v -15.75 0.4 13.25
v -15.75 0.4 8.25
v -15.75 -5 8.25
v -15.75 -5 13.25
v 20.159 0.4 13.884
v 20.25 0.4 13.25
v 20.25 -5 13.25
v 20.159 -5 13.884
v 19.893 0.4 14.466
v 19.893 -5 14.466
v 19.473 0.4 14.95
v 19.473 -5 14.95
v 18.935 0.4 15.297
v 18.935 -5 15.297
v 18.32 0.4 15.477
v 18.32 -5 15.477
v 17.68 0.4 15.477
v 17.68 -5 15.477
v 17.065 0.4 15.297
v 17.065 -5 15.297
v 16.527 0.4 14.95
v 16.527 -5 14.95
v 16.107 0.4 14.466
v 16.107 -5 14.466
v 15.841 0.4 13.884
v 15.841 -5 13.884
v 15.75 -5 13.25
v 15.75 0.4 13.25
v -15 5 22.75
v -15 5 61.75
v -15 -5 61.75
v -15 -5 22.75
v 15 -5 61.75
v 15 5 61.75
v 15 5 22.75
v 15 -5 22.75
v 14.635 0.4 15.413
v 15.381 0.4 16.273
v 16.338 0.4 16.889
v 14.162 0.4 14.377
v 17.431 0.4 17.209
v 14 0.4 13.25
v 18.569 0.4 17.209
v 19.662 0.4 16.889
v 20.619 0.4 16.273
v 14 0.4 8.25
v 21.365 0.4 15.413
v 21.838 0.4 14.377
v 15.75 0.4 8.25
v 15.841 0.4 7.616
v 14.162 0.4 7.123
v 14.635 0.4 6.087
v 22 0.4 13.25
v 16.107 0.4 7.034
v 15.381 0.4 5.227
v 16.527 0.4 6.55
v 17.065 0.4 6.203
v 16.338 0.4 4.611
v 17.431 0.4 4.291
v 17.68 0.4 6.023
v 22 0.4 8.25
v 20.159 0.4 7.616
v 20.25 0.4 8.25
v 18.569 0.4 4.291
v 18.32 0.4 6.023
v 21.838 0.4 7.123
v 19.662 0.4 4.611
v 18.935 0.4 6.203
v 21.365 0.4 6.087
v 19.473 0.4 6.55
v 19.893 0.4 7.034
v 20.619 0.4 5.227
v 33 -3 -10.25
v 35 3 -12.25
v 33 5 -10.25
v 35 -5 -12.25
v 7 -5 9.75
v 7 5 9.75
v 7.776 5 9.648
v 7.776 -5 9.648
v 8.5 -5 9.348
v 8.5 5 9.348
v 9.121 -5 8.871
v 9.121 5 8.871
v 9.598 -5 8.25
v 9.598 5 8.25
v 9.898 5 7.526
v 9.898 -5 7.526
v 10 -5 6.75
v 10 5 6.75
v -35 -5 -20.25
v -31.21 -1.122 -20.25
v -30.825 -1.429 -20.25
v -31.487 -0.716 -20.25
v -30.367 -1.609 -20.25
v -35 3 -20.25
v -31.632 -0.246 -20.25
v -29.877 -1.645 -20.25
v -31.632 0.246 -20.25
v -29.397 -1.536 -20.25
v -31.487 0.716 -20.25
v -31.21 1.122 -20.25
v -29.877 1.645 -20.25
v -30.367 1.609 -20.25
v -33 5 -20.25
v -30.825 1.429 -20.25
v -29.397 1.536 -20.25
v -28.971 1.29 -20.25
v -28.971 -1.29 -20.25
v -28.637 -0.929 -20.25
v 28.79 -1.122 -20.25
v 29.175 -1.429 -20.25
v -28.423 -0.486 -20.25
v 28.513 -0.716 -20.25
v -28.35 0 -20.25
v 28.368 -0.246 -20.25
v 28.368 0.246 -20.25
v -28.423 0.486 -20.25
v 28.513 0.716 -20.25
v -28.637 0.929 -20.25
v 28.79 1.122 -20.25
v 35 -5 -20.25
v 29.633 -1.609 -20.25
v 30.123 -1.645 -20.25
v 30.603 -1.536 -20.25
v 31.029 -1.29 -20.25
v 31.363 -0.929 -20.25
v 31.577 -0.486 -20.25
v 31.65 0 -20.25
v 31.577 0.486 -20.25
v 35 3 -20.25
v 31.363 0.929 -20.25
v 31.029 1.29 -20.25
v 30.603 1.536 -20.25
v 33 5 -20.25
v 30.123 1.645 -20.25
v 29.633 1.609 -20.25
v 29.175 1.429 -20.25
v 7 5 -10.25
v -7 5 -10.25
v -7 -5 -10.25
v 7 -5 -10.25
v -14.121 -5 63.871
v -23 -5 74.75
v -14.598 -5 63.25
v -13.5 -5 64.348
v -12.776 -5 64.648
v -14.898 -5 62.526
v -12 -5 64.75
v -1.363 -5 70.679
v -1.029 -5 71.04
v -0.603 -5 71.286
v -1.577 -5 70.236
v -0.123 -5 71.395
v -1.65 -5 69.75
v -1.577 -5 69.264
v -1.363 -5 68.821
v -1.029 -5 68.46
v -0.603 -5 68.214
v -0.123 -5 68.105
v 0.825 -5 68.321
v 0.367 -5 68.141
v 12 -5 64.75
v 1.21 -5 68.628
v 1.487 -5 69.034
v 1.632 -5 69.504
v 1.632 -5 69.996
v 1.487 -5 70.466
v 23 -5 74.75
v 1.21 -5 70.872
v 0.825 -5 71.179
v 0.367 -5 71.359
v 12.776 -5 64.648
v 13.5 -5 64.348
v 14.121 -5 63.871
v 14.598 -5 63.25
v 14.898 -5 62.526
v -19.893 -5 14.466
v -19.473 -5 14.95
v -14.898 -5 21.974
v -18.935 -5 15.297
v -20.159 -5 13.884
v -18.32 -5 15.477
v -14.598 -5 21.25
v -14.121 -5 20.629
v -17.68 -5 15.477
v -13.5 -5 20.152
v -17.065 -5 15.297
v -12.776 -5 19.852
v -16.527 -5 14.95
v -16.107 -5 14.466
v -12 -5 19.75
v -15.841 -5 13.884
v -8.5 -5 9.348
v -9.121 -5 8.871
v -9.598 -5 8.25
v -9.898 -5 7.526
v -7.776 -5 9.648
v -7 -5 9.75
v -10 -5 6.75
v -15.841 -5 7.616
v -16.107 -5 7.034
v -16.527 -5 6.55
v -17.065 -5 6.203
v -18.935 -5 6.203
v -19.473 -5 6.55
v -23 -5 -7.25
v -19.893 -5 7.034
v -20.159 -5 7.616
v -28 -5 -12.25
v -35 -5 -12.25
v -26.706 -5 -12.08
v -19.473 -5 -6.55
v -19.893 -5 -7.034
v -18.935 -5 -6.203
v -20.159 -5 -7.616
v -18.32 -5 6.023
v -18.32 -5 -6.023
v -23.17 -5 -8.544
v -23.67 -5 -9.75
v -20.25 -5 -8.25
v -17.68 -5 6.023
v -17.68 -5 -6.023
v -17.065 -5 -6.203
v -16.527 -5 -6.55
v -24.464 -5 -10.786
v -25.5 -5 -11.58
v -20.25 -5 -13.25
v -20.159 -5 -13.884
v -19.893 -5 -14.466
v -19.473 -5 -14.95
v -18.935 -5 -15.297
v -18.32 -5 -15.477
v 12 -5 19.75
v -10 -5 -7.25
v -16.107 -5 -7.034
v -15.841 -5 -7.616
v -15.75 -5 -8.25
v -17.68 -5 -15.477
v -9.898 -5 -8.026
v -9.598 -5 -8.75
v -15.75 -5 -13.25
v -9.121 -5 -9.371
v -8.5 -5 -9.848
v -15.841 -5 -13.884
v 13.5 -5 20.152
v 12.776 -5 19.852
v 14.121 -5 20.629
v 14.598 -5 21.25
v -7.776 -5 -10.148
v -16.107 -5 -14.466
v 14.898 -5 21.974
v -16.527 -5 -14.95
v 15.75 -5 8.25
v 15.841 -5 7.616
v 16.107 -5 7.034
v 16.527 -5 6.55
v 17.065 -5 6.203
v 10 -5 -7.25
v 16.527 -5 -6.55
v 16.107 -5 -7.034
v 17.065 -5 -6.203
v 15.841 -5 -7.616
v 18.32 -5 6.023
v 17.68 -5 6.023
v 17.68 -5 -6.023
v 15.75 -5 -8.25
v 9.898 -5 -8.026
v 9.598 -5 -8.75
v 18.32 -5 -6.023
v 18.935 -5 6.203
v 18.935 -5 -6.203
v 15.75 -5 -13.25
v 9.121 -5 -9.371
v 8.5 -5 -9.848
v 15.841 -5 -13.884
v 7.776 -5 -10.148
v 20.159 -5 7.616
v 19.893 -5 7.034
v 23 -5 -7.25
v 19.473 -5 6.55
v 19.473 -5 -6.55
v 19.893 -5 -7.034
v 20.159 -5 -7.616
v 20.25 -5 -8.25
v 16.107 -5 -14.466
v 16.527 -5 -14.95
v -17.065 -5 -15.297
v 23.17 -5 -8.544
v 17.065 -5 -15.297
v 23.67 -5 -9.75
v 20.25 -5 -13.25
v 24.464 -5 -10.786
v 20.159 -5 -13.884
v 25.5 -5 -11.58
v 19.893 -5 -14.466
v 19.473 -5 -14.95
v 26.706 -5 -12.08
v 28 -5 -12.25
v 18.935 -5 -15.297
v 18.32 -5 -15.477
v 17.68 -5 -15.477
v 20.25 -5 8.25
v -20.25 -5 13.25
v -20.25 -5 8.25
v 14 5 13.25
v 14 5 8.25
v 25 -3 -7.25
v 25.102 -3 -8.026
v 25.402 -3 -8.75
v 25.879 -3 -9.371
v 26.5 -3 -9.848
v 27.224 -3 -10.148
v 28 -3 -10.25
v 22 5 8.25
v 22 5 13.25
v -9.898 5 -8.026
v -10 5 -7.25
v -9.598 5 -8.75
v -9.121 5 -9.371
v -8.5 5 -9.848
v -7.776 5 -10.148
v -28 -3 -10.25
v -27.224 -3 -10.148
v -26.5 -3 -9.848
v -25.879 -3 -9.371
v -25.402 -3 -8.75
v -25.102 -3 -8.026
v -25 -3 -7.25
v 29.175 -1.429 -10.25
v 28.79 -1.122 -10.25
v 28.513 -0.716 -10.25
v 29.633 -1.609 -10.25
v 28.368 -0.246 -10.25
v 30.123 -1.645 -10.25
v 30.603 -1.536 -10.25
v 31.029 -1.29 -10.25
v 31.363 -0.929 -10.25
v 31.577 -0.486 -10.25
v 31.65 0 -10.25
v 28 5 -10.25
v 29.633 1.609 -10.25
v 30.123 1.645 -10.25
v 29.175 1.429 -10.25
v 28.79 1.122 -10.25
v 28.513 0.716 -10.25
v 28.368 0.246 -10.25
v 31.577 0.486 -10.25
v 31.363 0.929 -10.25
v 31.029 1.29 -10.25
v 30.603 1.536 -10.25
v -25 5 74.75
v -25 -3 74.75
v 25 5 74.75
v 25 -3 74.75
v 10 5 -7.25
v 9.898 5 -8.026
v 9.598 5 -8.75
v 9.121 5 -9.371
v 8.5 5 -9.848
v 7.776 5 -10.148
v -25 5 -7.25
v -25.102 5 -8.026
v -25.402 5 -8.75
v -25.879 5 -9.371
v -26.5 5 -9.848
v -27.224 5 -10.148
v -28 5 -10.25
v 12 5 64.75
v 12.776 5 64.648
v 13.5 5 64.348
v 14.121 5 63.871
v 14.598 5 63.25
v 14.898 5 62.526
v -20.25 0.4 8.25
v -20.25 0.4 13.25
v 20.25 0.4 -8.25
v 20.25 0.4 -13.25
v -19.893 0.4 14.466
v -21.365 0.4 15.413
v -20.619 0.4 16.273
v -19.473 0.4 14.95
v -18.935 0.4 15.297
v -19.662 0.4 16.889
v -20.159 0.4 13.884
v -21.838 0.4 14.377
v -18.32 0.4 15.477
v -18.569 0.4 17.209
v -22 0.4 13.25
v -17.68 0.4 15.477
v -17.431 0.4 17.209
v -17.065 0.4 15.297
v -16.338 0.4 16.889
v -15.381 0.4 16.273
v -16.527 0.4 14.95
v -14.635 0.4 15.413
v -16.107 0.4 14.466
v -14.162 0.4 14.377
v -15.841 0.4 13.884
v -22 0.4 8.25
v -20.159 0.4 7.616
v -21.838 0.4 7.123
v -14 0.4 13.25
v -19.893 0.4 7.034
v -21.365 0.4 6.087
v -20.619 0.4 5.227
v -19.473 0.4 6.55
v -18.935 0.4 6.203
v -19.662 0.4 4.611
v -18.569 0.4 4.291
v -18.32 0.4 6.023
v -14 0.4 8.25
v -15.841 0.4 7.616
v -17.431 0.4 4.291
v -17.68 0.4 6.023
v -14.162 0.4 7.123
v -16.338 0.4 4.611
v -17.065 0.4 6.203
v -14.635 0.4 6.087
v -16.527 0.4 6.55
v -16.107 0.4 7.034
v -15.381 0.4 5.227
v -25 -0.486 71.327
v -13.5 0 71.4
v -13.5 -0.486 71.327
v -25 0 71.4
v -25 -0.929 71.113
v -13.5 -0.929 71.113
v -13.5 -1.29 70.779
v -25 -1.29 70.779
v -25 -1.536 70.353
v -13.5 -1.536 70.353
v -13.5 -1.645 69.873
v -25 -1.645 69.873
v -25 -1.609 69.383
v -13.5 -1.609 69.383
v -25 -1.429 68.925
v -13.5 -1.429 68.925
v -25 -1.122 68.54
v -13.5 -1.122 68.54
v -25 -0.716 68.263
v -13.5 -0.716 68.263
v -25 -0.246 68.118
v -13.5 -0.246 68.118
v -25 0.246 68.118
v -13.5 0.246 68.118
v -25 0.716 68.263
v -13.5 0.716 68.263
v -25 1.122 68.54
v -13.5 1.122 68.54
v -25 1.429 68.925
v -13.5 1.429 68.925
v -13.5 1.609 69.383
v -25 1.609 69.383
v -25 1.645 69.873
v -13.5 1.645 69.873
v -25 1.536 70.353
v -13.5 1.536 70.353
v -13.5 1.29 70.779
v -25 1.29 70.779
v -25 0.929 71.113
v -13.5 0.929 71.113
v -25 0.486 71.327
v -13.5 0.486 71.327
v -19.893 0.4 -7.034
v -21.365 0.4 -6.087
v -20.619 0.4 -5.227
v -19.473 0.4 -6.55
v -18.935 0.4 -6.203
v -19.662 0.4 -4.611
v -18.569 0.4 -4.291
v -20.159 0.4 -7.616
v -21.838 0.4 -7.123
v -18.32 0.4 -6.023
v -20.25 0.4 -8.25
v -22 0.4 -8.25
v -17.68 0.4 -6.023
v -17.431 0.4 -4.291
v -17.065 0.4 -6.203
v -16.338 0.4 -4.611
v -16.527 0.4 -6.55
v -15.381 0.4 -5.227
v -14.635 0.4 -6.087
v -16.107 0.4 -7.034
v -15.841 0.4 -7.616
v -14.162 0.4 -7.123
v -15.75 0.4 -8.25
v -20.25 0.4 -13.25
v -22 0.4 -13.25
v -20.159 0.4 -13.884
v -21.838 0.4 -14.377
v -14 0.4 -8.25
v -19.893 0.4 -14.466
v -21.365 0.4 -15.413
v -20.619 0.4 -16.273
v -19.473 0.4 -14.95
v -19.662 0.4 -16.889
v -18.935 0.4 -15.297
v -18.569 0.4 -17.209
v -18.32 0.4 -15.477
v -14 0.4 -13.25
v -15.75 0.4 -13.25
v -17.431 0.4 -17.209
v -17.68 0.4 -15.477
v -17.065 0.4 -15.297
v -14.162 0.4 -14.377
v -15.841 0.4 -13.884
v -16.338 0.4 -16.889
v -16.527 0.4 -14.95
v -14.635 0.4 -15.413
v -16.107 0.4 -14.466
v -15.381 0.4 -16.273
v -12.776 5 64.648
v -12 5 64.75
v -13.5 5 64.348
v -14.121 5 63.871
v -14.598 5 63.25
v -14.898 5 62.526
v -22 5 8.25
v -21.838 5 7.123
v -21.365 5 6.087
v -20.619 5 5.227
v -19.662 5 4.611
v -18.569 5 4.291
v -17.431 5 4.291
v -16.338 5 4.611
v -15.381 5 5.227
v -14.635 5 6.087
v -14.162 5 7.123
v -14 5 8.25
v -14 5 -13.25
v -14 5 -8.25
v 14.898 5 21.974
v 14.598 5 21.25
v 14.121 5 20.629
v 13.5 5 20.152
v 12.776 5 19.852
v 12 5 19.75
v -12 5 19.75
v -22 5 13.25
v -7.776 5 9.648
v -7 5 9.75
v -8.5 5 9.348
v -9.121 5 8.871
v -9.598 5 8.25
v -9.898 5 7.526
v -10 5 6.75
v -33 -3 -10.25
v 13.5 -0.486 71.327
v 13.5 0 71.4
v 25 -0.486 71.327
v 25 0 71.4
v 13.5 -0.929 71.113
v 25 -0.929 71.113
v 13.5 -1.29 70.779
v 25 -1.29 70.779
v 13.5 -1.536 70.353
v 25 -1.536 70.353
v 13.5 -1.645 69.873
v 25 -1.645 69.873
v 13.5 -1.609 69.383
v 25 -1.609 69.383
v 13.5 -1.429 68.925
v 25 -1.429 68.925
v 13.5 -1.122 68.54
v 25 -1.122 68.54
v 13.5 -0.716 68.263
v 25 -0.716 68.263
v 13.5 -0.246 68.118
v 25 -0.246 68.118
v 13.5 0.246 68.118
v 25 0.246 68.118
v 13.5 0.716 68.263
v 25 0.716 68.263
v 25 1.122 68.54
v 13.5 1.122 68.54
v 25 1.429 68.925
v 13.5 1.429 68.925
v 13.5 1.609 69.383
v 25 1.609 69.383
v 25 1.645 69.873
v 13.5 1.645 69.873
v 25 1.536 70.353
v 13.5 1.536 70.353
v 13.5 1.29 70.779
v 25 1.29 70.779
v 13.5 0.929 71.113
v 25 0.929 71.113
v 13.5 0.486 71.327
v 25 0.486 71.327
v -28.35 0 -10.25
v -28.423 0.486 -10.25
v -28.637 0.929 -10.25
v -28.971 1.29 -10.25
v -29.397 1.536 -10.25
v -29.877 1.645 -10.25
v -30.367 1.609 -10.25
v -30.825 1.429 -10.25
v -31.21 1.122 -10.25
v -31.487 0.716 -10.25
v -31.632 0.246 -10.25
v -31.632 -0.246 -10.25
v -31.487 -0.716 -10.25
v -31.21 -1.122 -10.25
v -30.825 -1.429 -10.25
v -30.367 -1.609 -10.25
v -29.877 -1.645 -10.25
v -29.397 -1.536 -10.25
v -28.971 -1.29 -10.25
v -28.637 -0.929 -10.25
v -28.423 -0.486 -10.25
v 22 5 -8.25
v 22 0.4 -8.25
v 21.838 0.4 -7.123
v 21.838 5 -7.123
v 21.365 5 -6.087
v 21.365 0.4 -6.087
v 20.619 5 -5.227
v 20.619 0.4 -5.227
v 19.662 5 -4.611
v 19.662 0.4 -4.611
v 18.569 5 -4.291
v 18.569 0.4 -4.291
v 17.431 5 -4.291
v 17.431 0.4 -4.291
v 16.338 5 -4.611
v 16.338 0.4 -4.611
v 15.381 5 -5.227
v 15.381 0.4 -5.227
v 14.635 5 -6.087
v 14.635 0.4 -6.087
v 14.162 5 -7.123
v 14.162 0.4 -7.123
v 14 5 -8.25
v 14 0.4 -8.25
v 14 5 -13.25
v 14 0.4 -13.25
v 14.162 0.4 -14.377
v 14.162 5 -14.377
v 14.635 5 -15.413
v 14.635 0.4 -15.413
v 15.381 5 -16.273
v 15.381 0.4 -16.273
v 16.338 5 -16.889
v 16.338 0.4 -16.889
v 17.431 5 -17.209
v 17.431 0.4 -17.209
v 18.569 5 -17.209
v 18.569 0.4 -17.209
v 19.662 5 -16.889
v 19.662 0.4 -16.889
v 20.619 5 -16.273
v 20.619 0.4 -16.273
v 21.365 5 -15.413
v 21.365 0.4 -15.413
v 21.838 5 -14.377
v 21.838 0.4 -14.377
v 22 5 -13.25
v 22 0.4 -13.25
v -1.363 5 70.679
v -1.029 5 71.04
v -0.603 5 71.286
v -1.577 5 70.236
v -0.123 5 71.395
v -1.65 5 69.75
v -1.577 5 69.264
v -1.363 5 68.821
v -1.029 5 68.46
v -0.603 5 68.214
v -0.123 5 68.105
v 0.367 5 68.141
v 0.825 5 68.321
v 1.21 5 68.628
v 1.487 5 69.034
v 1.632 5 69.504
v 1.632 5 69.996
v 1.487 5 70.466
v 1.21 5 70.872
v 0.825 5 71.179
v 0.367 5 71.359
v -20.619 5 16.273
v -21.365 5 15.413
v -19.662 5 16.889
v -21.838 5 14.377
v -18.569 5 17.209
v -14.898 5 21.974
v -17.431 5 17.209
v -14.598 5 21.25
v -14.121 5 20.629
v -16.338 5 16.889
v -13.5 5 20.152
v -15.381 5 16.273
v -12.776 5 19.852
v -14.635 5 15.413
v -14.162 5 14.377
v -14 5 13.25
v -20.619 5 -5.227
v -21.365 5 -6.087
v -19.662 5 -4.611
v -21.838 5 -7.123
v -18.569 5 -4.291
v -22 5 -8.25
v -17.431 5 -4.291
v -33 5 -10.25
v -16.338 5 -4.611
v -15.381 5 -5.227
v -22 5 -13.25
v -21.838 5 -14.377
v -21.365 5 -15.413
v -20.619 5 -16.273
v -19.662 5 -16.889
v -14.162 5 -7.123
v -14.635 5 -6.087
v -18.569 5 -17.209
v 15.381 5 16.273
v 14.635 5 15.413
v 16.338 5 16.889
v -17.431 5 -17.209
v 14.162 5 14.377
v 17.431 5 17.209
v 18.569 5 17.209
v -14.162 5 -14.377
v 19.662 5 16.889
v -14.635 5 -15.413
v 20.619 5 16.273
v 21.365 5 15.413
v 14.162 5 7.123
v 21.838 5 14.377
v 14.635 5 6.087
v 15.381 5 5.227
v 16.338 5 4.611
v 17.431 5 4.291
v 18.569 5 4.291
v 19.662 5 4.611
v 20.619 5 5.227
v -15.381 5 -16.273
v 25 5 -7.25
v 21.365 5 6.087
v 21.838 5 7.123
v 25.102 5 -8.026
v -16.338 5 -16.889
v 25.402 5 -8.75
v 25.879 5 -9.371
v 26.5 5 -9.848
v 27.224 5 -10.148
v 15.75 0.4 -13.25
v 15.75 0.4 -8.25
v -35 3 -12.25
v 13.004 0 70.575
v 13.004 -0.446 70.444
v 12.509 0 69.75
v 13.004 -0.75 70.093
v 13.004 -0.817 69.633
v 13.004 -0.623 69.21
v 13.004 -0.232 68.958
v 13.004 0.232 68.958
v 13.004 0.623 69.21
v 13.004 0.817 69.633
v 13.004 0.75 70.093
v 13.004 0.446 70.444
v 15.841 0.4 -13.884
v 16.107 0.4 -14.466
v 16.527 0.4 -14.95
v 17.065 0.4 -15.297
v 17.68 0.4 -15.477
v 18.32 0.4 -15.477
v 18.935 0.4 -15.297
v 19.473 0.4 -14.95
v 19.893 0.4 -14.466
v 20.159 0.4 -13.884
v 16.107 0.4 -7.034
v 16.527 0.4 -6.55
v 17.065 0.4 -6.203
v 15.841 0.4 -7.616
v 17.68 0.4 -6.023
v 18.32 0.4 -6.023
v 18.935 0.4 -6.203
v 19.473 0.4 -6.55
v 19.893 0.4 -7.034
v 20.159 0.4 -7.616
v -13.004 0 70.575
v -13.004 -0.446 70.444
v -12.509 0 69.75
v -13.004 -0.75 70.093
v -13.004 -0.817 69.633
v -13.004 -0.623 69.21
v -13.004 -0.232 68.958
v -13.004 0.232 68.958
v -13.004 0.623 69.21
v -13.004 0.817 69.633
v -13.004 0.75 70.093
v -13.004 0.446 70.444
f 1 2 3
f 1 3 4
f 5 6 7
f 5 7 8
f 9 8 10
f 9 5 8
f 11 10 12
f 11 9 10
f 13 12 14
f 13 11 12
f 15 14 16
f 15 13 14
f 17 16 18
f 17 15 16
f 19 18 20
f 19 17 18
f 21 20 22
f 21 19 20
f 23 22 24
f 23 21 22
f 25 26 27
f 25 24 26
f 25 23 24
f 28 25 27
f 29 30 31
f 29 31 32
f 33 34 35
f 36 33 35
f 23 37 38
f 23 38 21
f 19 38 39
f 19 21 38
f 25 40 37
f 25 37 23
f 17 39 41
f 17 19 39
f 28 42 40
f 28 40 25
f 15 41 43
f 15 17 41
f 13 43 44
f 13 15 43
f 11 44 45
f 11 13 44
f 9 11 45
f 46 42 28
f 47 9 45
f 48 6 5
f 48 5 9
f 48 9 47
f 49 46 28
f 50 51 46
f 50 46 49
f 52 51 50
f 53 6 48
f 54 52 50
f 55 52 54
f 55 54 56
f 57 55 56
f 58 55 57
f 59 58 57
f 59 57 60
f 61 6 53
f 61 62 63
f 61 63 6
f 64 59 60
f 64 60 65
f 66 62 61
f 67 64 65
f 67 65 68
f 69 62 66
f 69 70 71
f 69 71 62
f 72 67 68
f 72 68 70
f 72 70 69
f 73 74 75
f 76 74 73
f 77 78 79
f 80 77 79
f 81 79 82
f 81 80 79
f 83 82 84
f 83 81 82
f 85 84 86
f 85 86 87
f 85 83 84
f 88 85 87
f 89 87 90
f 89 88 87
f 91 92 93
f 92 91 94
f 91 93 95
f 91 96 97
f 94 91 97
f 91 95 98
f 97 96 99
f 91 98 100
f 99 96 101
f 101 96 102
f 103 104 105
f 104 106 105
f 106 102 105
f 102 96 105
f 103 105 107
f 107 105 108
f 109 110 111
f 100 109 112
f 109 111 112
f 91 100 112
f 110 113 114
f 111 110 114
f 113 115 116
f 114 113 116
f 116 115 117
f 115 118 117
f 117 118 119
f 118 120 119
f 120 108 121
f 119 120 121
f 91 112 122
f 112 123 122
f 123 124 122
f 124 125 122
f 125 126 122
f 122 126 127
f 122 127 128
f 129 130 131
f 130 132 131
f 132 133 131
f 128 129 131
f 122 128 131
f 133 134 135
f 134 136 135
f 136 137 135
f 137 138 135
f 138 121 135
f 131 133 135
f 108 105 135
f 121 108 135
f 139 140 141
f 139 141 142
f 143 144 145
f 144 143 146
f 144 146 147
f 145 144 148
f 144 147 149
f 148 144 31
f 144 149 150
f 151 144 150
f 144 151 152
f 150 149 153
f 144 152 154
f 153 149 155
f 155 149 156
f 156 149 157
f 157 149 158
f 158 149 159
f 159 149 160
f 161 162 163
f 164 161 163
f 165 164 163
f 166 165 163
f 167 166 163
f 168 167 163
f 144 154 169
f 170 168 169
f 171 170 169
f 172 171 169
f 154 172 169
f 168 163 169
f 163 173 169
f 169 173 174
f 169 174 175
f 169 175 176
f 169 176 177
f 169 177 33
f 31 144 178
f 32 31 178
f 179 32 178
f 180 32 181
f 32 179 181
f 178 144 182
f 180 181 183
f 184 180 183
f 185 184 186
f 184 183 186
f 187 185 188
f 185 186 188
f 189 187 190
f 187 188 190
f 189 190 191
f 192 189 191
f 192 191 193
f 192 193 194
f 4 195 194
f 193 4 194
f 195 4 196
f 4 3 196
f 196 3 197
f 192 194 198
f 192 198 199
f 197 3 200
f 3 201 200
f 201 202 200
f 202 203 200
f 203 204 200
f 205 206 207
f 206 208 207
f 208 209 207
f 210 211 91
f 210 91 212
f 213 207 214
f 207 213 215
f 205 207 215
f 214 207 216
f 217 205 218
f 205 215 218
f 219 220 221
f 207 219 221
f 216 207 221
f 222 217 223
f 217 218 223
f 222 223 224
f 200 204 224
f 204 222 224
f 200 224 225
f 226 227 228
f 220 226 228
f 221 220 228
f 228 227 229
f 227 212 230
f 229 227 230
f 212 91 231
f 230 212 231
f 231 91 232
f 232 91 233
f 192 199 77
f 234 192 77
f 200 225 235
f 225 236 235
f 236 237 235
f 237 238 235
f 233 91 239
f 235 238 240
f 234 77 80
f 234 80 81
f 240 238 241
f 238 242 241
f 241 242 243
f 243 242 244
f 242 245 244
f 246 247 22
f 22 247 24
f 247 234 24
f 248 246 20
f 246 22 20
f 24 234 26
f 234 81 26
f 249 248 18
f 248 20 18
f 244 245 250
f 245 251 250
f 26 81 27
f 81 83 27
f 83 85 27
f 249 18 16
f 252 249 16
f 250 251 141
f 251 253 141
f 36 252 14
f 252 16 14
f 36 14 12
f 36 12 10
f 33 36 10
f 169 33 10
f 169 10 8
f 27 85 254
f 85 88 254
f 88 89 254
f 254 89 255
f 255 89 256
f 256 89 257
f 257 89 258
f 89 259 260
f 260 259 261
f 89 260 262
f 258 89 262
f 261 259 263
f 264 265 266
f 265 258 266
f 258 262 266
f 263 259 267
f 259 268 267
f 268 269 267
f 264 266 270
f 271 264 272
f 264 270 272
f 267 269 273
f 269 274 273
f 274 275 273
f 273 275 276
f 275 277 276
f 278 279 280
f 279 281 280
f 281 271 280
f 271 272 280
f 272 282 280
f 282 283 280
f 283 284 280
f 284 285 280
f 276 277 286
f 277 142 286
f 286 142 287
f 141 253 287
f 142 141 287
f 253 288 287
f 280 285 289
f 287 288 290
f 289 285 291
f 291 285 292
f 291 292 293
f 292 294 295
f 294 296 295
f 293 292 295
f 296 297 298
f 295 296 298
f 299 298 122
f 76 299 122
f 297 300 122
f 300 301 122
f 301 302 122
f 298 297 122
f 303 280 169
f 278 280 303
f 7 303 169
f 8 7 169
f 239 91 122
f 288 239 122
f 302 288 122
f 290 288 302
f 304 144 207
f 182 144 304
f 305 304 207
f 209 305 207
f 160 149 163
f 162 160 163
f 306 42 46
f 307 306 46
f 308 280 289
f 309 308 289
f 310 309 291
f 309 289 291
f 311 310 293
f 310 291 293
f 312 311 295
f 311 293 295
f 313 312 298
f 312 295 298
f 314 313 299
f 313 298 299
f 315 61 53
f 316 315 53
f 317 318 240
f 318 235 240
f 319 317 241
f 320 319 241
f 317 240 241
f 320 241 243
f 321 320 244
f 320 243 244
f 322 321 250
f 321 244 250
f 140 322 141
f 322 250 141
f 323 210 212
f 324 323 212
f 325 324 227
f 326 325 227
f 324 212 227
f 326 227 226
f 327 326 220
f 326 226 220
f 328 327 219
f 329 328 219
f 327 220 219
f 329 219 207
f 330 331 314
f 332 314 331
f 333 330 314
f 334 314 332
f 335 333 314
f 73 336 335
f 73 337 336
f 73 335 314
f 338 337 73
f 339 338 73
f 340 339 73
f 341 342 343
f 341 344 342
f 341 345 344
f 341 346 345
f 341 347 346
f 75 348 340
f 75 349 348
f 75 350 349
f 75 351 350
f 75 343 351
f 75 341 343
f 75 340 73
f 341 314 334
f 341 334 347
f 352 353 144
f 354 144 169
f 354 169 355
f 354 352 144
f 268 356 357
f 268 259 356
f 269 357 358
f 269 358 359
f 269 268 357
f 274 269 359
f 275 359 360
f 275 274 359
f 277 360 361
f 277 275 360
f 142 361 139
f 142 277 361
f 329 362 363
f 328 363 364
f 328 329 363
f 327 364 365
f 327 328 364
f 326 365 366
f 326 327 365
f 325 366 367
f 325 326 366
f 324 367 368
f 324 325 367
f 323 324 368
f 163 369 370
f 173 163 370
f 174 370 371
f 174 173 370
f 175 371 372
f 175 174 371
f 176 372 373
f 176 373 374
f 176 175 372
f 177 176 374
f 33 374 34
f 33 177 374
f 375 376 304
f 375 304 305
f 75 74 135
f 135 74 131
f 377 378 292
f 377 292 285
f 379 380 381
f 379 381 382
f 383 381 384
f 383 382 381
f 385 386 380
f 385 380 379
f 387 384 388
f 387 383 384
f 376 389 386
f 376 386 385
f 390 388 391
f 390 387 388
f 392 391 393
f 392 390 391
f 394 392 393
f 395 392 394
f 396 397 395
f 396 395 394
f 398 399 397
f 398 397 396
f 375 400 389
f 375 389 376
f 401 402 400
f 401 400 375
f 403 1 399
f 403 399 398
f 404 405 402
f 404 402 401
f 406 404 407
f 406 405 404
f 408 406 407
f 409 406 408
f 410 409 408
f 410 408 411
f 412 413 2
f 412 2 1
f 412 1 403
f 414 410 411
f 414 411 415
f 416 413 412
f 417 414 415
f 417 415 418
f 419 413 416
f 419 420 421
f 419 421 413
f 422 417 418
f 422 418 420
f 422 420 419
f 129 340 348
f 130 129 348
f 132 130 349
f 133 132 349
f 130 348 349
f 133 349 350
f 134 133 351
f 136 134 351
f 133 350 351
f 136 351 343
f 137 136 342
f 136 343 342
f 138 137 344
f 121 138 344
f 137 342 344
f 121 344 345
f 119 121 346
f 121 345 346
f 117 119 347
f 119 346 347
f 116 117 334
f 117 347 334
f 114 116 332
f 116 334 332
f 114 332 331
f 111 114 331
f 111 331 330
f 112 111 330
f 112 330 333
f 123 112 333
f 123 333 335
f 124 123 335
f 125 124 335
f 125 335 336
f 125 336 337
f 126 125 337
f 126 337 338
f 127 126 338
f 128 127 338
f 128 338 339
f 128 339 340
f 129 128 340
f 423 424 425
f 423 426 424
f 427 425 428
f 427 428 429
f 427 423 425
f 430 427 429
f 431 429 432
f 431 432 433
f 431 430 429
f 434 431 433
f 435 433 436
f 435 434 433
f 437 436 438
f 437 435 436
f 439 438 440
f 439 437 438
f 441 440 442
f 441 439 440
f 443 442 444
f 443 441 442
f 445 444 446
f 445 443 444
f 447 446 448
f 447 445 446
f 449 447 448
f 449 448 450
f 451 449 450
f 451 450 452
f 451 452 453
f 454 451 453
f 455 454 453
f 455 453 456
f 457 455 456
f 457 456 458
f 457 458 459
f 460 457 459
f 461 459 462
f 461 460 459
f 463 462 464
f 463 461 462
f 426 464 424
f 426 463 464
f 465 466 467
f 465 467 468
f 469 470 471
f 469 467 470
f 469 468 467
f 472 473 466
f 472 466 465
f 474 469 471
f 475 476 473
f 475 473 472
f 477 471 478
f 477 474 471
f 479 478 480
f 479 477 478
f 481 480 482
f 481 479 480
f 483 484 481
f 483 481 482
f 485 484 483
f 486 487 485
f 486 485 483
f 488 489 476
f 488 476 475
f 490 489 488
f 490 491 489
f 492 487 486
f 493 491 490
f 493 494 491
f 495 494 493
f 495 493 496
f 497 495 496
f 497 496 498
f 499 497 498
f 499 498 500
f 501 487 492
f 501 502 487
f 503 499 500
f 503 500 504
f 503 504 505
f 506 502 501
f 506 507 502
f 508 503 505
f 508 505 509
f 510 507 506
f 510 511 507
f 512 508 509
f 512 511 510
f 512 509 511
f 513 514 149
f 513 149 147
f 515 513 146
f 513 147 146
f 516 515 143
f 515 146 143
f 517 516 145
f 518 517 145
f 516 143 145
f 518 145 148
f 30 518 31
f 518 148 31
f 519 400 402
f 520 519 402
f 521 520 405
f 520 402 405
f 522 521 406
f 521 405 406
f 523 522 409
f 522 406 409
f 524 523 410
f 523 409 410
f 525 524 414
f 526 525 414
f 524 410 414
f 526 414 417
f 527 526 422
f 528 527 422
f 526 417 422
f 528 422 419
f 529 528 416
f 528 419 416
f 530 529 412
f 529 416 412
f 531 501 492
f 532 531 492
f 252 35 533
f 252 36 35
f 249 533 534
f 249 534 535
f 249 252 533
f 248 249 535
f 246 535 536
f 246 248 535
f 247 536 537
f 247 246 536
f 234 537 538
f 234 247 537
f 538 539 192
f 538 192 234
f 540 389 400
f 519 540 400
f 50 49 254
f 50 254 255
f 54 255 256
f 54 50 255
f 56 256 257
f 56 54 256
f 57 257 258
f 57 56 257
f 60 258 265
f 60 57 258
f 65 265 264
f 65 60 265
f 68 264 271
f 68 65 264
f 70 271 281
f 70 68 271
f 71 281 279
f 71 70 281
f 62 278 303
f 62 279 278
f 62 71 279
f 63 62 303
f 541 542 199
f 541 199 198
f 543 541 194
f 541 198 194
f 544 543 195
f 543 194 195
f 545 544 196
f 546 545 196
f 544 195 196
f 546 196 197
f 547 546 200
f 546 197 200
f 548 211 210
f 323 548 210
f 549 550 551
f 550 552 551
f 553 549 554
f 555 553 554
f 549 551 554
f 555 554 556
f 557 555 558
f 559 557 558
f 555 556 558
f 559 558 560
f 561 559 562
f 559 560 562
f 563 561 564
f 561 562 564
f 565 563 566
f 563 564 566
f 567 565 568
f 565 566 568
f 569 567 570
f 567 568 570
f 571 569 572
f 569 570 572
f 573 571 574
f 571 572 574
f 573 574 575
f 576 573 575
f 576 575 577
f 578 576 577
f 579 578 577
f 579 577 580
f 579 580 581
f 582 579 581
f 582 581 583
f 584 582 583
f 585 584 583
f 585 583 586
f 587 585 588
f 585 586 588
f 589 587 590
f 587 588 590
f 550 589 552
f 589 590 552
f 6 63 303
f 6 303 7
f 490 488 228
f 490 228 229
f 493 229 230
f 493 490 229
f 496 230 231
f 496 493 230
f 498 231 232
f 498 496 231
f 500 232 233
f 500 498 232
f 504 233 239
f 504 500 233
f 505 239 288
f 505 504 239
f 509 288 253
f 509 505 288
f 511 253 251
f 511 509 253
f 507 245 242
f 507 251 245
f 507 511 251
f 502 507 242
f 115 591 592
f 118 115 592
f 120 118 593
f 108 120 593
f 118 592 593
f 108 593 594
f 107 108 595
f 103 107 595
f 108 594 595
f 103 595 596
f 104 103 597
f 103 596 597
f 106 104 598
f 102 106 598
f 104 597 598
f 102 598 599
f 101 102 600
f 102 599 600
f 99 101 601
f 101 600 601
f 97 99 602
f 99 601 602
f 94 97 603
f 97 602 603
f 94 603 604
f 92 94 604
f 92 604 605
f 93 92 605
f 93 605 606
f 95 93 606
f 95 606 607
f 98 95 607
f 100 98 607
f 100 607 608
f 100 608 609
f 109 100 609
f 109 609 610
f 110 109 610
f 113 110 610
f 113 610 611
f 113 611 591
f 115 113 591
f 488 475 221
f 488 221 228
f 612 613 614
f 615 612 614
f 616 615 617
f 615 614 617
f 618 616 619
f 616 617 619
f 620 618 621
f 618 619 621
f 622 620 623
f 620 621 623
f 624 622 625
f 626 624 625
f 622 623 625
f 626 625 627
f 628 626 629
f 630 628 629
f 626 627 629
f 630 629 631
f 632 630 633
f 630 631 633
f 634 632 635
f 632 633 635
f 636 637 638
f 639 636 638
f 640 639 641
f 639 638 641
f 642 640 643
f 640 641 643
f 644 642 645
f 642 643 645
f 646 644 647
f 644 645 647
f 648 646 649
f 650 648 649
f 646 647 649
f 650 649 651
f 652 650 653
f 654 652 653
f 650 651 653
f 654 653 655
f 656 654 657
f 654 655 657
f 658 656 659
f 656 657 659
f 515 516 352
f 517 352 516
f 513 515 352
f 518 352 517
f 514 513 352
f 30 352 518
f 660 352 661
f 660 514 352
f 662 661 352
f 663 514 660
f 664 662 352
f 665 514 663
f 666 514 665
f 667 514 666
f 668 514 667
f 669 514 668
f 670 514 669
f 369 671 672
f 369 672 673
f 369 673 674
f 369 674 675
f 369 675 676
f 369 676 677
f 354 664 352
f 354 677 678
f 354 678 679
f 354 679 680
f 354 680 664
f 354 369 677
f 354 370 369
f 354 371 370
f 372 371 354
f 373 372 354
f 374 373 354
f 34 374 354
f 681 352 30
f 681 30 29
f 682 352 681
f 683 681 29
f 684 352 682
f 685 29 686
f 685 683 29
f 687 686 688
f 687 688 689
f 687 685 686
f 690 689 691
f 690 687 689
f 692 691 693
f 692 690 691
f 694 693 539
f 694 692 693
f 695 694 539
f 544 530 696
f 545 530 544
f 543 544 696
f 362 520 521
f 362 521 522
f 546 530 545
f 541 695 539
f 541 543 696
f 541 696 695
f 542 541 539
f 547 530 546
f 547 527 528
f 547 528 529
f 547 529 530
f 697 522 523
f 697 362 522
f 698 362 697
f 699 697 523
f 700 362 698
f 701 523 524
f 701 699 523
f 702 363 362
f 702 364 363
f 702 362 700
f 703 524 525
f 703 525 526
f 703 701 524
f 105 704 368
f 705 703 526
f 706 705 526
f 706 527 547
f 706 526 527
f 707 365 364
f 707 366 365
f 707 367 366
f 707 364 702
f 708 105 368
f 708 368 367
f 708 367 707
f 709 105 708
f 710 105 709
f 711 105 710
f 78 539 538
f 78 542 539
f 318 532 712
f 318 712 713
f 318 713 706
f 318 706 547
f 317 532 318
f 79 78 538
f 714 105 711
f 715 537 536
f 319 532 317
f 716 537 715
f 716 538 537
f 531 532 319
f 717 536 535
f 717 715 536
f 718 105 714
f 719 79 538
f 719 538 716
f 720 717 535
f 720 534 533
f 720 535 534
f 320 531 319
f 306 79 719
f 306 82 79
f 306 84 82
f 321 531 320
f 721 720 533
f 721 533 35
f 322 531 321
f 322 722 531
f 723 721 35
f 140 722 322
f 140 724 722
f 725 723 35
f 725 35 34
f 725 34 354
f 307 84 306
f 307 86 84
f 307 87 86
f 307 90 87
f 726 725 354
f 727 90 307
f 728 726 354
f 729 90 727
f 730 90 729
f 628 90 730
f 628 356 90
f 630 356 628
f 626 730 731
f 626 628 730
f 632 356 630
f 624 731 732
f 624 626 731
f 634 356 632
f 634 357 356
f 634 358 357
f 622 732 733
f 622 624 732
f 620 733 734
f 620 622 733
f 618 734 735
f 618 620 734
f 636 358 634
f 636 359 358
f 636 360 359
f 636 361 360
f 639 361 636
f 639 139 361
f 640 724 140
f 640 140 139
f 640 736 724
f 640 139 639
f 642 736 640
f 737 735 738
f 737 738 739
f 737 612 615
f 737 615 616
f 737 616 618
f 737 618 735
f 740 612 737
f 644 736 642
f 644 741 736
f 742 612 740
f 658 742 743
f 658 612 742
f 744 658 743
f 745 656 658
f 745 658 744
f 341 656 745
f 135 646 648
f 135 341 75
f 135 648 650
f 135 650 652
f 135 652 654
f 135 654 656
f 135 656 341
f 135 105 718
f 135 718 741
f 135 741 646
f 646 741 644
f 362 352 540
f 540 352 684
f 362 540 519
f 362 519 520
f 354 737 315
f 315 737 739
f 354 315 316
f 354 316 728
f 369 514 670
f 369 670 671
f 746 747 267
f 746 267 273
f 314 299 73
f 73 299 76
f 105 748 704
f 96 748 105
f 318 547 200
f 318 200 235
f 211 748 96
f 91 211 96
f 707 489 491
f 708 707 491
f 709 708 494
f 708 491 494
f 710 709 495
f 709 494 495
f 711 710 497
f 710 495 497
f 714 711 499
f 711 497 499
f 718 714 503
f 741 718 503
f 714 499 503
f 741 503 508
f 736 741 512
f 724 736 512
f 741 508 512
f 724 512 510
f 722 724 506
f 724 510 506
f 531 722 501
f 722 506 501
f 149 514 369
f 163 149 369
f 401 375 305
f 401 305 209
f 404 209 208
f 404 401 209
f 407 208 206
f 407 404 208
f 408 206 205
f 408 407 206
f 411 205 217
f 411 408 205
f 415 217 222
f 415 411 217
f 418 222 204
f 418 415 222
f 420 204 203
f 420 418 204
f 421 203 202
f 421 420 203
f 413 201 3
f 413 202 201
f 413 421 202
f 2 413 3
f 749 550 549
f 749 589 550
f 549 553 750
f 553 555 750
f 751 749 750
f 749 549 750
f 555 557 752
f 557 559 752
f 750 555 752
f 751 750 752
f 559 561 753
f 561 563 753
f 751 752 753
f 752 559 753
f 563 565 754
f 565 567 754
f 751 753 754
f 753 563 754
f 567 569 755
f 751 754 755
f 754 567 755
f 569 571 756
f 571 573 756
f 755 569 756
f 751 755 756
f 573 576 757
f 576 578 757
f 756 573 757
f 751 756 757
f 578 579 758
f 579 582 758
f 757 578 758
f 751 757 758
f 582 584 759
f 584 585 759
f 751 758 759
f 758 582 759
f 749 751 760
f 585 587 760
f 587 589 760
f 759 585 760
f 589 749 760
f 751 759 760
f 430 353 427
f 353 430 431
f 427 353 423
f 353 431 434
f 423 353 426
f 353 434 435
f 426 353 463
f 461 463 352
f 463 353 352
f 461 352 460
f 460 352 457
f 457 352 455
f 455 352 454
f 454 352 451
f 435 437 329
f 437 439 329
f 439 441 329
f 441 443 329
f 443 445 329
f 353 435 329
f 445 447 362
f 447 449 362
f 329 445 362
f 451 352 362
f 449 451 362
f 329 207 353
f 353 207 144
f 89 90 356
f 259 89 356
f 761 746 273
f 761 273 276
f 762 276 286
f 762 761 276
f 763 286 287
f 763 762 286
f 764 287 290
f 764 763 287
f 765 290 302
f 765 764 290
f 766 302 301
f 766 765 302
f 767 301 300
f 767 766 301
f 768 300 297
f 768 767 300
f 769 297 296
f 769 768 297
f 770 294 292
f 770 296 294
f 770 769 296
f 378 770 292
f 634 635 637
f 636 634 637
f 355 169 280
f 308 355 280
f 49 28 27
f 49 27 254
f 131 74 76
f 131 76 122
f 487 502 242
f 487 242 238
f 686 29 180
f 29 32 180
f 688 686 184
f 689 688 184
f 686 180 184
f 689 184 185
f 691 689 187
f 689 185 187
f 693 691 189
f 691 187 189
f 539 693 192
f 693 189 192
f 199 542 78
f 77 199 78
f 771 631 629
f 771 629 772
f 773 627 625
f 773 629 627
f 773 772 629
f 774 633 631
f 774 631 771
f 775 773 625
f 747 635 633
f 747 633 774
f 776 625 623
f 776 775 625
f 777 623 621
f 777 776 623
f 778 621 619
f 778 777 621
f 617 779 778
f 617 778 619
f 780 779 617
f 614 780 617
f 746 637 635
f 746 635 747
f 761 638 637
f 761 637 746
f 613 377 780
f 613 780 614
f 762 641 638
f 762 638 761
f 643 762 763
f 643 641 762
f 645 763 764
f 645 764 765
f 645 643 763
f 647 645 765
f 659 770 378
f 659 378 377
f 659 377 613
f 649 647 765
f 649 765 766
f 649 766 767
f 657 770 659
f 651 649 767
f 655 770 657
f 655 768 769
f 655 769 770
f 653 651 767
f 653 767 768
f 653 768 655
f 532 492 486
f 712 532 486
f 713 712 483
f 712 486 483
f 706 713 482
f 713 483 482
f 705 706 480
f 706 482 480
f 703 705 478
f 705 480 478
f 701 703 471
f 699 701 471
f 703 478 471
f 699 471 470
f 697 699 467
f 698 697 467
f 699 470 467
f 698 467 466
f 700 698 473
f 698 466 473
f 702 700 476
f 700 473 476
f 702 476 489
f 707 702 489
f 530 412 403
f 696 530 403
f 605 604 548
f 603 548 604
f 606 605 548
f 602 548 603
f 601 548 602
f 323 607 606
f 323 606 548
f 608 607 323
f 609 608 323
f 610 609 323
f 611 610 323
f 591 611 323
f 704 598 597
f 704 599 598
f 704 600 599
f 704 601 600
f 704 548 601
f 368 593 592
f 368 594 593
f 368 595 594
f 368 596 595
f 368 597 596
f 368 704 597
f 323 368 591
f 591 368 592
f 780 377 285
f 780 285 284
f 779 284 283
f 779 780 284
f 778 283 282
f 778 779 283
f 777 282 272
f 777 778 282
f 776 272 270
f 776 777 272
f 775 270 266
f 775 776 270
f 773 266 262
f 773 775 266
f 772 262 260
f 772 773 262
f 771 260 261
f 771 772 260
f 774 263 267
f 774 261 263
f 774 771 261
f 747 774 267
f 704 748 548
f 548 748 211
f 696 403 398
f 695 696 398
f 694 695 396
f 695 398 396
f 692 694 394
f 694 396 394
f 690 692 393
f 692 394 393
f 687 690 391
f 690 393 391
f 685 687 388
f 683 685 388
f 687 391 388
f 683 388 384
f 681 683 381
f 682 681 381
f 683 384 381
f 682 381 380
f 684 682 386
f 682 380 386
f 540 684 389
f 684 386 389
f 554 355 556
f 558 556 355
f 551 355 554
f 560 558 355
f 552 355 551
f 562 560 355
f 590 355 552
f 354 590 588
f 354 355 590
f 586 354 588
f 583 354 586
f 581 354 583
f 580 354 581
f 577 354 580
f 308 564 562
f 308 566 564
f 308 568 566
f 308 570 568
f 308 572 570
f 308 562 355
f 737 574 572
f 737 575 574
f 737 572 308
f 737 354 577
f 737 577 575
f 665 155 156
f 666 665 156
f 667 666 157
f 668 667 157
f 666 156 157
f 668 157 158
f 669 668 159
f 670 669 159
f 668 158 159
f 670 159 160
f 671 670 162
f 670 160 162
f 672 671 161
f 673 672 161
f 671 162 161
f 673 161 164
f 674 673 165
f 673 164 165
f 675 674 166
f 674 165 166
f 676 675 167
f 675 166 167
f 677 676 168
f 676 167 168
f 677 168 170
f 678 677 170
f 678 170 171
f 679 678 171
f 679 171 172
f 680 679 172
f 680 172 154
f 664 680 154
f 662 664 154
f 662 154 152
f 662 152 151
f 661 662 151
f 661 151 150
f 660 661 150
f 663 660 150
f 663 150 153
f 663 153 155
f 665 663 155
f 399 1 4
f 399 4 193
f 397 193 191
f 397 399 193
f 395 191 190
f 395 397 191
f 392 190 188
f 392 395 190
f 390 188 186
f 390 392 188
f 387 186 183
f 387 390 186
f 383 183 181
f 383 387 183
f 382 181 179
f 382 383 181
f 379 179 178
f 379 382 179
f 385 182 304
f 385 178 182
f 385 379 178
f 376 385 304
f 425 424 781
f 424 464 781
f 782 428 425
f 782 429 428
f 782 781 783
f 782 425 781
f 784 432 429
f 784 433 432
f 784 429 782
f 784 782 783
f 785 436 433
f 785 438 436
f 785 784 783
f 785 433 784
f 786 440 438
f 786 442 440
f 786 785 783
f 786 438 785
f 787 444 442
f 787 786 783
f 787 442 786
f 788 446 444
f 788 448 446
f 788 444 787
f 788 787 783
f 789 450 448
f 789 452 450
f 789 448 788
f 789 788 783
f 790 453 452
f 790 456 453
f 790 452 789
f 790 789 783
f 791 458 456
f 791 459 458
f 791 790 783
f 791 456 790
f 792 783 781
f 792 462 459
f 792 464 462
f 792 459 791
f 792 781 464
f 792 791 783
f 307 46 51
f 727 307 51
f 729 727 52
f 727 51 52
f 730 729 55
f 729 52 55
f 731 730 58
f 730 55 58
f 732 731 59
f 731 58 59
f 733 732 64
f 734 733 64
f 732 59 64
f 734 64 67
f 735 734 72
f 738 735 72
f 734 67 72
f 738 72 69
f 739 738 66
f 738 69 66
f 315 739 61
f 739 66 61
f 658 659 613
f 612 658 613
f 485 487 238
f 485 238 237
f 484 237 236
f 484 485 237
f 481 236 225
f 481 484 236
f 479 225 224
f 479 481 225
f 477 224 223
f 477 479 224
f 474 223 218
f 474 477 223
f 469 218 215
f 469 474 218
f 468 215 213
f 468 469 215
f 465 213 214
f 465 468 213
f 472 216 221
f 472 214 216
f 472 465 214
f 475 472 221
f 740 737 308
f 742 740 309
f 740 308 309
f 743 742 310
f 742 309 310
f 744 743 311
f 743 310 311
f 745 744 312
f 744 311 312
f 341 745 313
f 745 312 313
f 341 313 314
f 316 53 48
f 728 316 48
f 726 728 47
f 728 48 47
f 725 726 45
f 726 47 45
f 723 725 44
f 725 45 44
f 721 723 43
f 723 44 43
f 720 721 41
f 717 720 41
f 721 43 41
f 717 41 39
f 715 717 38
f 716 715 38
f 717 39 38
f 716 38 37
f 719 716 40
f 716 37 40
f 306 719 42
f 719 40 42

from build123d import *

# Parameters (mm, degrees)
SKETCH1_W                                            = 70
SKETCH1_H                                            = 40.5
BOSS_EXTRUDE1_DEPTH                                  = 5
CBORE_FOR_M4_HEXAGON_SOCKET_HEAD_CAP_SCR_D           = 4.5
CBORE_FOR_M4_HEXAGON_SOCKET_HEAD_CAP_SCR_CBORE_D     = 8
CBORE_FOR_M4_HEXAGON_SOCKET_HEAD_CAP_SCR_CBORE_DEPTH = 4.6
CUT_EXTRUDE1_DEPTH                                   = 41.794883258
CUT_EXTRUDE2_DEPTH                                   = 41.794883258
M4_TAPPED_HOLE1_D                                    = 3.3
SKETCH10_W                                           = 10
SKETCH10_H                                           = 30.5
CUT_EXTRUDE3_DEPTH                                   = 42.654081433
SKETCH13_W                                           = 50
SKETCH13_H                                           = 54.5
BOSS_EXTRUDE3_DEPTH                                  = 10
SKETCH14_W                                           = 20
SKETCH14_H                                           = 20
SKETCH14_W_2                                         = 30
SKETCH14_H_2                                         = 45
CUT_EXTRUDE4_DEPTH                                   = 84.141821606
M4_TAPPED_HOLE3_D                                    = 3.3
M4_TAPPED_HOLE3_DEPTH                                = 11.5
M4_TAPPED_HOLE3_TIP                                  = 0.991420021
FILLET1_R                                            = 3
CHAMFER1_SIZE                                        = 2
CHAMFER2_SIZE                                        = 2
CHAMFER3_SIZE                                        = 2


with BuildPart() as part:
    # Sketch1 → Boss-Extrude1 (new, symmetric)
    with BuildSketch(Plane(origin=(0, 0, 0), x_dir=(1, 0, 0), z_dir=(0, 1, 0))):
        Rectangle(SKETCH1_W, SKETCH1_H)
    extrude(amount=BOSS_EXTRUDE1_DEPTH, both=True)

    # CBORE for M4 Hexagon socket head cap screws1 (through all)
    with Locations(Plane(origin=(0, 5, 0), x_dir=(1, 0, 0), z_dir=(0, 1, 0))):
        with Locations((-18, 10.75), (18, 10.75), (18, -10.75), (-18, -10.75)):
            CounterBoreHole(CBORE_FOR_M4_HEXAGON_SOCKET_HEAD_CAP_SCR_D / 2, CBORE_FOR_M4_HEXAGON_SOCKET_HEAD_CAP_SCR_CBORE_D / 2, CBORE_FOR_M4_HEXAGON_SOCKET_HEAD_CAP_SCR_CBORE_DEPTH)

    # Sketch4 → Cut-Extrude1 (cut, through all)
    with BuildSketch(Plane(origin=(0, 0.4, 0), x_dir=(1, 0, 0), z_dir=(0, 1, 0))):
        with BuildLine():
            Line((-22, 8.25), (-22, 13.25))
            ThreePointArc((-22, 13.25), (-18, 17.25), (-14, 13.25))
            Line((-14, 13.25), (-14, 8.25))
            ThreePointArc((-14, 8.25), (-18, 4.25), (-22, 8.25))
        make_face()
        with BuildLine():
            Line((22, 13.25), (22, 8.25))
            ThreePointArc((22, 8.25), (18, 4.25), (14, 8.25))
            Line((14, 8.25), (14, 13.25))
            ThreePointArc((14, 13.25), (18, 17.25), (22, 13.25))
        make_face()
        with BuildLine():
            Line((-14, -8.25), (-14, -13.25))
            ThreePointArc((-14, -13.25), (-18, -17.25), (-22, -13.25))
            Line((-22, -13.25), (-22, -8.25))
            ThreePointArc((-22, -8.25), (-18, -4.25), (-14, -8.25))
        make_face()
        with BuildLine():
            Line((22, -8.25), (22, -13.25))
            ThreePointArc((22, -13.25), (18, -17.25), (14, -13.25))
            Line((14, -13.25), (14, -8.25))
            ThreePointArc((14, -8.25), (18, -4.25), (22, -8.25))
        make_face()
    extrude(amount=CUT_EXTRUDE1_DEPTH, mode=Mode.SUBTRACT)

    # Sketch5 → Cut-Extrude2 (cut, through all)
    with BuildSketch(Plane(origin=(0, 0.4, 0), x_dir=(1, 0, 0), z_dir=(0, 1, 0))):
        with BuildLine():
            Line((-15.75, 13.25), (-15.75, 8.25))
            ThreePointArc((-15.75, 8.25), (-18, 6), (-20.25, 8.25))
            Line((-20.25, 8.25), (-20.25, 13.25))
            ThreePointArc((-20.25, 13.25), (-18, 15.5), (-15.75, 13.25))
        make_face()
        with BuildLine():
            Line((20.25, 13.25), (20.25, 8.25))
            ThreePointArc((20.25, 8.25), (18, 6), (15.75, 8.25))
            Line((15.75, 8.25), (15.75, 13.25))
            ThreePointArc((15.75, 13.25), (18, 15.5), (20.25, 13.25))
        make_face()
        with BuildLine():
            Line((-15.75, -8.25), (-15.75, -13.25))
            ThreePointArc((-15.75, -13.25), (-18, -15.5), (-20.25, -13.25))
            Line((-20.25, -13.25), (-20.25, -8.25))
            ThreePointArc((-20.25, -8.25), (-18, -6), (-15.75, -8.25))
        make_face()
        with BuildLine():
            Line((20.25, -8.25), (20.25, -13.25))
            ThreePointArc((20.25, -13.25), (18, -15.5), (15.75, -13.25))
            Line((15.75, -13.25), (15.75, -8.25))
            ThreePointArc((15.75, -8.25), (18, -6), (20.25, -8.25))
        make_face()
    extrude(amount=-CUT_EXTRUDE2_DEPTH, mode=Mode.SUBTRACT)

    # M4 Tapped Hole1 (through all)
    with Locations(Plane(origin=(0, 0, -20.25), x_dir=(-1, 0, 0), z_dir=(0, 0, -1))):
        with Locations((-30, 0), (30, 0)):
            Hole(M4_TAPPED_HOLE1_D / 2)

    # Sketch10 → Cut-Extrude3 (cut, through all)
    with BuildSketch(Plane(origin=(0, 5, 0), x_dir=(1, 0, 0), z_dir=(0, 1, 0))):
        with Locations((-30, -5)):
            Rectangle(SKETCH10_W, SKETCH10_H)
        with Locations((30, -5)):
            Rectangle(SKETCH10_W, SKETCH10_H)
    extrude(amount=-CUT_EXTRUDE3_DEPTH, mode=Mode.SUBTRACT)

    # Sketch13 → Boss-Extrude3 (add)
    with BuildSketch(Plane(origin=(0, 5, 0), x_dir=(1, 0, 0), z_dir=(0, 1, 0))):
        with Locations((0, -47.5)):
            Rectangle(SKETCH13_W, SKETCH13_H)
    extrude(amount=-BOSS_EXTRUDE3_DEPTH)

    # Sketch14 → Cut-Extrude4 (cut, through all)
    with BuildSketch(Plane(origin=(0, 5, 0), x_dir=(1, 0, 0), z_dir=(0, 1, 0))):
        with Locations((0, 0.25)):
            Rectangle(SKETCH14_W, SKETCH14_H)
        with Locations((0, -42.25)):
            Rectangle(SKETCH14_W_2, SKETCH14_H_2)
    extrude(amount=-CUT_EXTRUDE4_DEPTH, mode=Mode.SUBTRACT)

    # Sketch17 → M4 Tapped Hole2 (revolve, cut)
    with BuildSketch(Plane(origin=(-25, 0, 69.75), x_dir=(0, 0, 1), z_dir=(0, 1, 0))):
        Polygon((0, 0), (0, 12.491420021), (1.65, 11.5), (1.65, 0), align=None)
    m4_tapped_hole2 = revolve(axis=Axis((-31.35, 0, 69.75), (1, 0, 0)), mode=Mode.SUBTRACT)

    # Mirror1: M4 Tapped Hole2 across plane
    add(m4_tapped_hole2.mirror(Plane(origin=(0, 0, 0), x_dir=(0, 0, 1), z_dir=(1, 0, 0))), mode=Mode.SUBTRACT)

    # M4 Tapped Hole3
    with Locations(Plane(origin=(0, 5, 0), x_dir=(1, 0, 0), z_dir=(0, 1, 0))):
        with Locations((0, -69.75)):
            Hole(M4_TAPPED_HOLE3_D / 2, depth=M4_TAPPED_HOLE3_DEPTH)
            with Locations((0, 0, -(M4_TAPPED_HOLE3_DEPTH + M4_TAPPED_HOLE3_TIP / 2))):  # 118° drill point
                Cone(0, M4_TAPPED_HOLE3_D / 2, M4_TAPPED_HOLE3_TIP, mode=Mode.SUBTRACT)

    # Fillet1
    fillet1_edges = [part.edges().sort_by_distance(p)[0] for p in [
        (-25, 0, -10.25),
        (25, 0, -10.25),
        (-10, 0, 9.75),
        (-10, 0, -10.25),
        (10, 0, -10.25),
        (10, 0, 9.75),
        (-15, 0, 19.75),
        (15, 0, 19.75),
        (15, 0, 64.75),
        (-15, 0, 64.75),
    ]]
    fillet(fillet1_edges, radius=FILLET1_R)

    # Chamfer1
    chamfer1_edges = [part.edges().sort_by_distance(p)[0] for p in [
        (-35, 0, -10.25),
        (35, 0, -10.25),
    ]]
    chamfer(chamfer1_edges, length=CHAMFER1_SIZE)

    # Chamfer2
    chamfer2_edges = [part.edges().sort_by_distance(p)[0] for p in [
        (35, 5, -16.25),
        (-35, 5, -16.25),
    ]]
    chamfer(chamfer2_edges, length=CHAMFER2_SIZE)

    # Chamfer3
    chamfer3_edges = [part.edges().sort_by_distance(p)[0] for p in [
        (-30.5, -5, -10.25),
        (-25.878679656, -5, -9.371320344),
        (-25, -5, 33.75),
        (30.5, -5, -10.25),
        (25.878679656, -5, -9.371320344),
        (25, -5, 33.75),
    ]]
    chamfer(chamfer3_edges, length=CHAMFER3_SIZE)


solid = part.part
